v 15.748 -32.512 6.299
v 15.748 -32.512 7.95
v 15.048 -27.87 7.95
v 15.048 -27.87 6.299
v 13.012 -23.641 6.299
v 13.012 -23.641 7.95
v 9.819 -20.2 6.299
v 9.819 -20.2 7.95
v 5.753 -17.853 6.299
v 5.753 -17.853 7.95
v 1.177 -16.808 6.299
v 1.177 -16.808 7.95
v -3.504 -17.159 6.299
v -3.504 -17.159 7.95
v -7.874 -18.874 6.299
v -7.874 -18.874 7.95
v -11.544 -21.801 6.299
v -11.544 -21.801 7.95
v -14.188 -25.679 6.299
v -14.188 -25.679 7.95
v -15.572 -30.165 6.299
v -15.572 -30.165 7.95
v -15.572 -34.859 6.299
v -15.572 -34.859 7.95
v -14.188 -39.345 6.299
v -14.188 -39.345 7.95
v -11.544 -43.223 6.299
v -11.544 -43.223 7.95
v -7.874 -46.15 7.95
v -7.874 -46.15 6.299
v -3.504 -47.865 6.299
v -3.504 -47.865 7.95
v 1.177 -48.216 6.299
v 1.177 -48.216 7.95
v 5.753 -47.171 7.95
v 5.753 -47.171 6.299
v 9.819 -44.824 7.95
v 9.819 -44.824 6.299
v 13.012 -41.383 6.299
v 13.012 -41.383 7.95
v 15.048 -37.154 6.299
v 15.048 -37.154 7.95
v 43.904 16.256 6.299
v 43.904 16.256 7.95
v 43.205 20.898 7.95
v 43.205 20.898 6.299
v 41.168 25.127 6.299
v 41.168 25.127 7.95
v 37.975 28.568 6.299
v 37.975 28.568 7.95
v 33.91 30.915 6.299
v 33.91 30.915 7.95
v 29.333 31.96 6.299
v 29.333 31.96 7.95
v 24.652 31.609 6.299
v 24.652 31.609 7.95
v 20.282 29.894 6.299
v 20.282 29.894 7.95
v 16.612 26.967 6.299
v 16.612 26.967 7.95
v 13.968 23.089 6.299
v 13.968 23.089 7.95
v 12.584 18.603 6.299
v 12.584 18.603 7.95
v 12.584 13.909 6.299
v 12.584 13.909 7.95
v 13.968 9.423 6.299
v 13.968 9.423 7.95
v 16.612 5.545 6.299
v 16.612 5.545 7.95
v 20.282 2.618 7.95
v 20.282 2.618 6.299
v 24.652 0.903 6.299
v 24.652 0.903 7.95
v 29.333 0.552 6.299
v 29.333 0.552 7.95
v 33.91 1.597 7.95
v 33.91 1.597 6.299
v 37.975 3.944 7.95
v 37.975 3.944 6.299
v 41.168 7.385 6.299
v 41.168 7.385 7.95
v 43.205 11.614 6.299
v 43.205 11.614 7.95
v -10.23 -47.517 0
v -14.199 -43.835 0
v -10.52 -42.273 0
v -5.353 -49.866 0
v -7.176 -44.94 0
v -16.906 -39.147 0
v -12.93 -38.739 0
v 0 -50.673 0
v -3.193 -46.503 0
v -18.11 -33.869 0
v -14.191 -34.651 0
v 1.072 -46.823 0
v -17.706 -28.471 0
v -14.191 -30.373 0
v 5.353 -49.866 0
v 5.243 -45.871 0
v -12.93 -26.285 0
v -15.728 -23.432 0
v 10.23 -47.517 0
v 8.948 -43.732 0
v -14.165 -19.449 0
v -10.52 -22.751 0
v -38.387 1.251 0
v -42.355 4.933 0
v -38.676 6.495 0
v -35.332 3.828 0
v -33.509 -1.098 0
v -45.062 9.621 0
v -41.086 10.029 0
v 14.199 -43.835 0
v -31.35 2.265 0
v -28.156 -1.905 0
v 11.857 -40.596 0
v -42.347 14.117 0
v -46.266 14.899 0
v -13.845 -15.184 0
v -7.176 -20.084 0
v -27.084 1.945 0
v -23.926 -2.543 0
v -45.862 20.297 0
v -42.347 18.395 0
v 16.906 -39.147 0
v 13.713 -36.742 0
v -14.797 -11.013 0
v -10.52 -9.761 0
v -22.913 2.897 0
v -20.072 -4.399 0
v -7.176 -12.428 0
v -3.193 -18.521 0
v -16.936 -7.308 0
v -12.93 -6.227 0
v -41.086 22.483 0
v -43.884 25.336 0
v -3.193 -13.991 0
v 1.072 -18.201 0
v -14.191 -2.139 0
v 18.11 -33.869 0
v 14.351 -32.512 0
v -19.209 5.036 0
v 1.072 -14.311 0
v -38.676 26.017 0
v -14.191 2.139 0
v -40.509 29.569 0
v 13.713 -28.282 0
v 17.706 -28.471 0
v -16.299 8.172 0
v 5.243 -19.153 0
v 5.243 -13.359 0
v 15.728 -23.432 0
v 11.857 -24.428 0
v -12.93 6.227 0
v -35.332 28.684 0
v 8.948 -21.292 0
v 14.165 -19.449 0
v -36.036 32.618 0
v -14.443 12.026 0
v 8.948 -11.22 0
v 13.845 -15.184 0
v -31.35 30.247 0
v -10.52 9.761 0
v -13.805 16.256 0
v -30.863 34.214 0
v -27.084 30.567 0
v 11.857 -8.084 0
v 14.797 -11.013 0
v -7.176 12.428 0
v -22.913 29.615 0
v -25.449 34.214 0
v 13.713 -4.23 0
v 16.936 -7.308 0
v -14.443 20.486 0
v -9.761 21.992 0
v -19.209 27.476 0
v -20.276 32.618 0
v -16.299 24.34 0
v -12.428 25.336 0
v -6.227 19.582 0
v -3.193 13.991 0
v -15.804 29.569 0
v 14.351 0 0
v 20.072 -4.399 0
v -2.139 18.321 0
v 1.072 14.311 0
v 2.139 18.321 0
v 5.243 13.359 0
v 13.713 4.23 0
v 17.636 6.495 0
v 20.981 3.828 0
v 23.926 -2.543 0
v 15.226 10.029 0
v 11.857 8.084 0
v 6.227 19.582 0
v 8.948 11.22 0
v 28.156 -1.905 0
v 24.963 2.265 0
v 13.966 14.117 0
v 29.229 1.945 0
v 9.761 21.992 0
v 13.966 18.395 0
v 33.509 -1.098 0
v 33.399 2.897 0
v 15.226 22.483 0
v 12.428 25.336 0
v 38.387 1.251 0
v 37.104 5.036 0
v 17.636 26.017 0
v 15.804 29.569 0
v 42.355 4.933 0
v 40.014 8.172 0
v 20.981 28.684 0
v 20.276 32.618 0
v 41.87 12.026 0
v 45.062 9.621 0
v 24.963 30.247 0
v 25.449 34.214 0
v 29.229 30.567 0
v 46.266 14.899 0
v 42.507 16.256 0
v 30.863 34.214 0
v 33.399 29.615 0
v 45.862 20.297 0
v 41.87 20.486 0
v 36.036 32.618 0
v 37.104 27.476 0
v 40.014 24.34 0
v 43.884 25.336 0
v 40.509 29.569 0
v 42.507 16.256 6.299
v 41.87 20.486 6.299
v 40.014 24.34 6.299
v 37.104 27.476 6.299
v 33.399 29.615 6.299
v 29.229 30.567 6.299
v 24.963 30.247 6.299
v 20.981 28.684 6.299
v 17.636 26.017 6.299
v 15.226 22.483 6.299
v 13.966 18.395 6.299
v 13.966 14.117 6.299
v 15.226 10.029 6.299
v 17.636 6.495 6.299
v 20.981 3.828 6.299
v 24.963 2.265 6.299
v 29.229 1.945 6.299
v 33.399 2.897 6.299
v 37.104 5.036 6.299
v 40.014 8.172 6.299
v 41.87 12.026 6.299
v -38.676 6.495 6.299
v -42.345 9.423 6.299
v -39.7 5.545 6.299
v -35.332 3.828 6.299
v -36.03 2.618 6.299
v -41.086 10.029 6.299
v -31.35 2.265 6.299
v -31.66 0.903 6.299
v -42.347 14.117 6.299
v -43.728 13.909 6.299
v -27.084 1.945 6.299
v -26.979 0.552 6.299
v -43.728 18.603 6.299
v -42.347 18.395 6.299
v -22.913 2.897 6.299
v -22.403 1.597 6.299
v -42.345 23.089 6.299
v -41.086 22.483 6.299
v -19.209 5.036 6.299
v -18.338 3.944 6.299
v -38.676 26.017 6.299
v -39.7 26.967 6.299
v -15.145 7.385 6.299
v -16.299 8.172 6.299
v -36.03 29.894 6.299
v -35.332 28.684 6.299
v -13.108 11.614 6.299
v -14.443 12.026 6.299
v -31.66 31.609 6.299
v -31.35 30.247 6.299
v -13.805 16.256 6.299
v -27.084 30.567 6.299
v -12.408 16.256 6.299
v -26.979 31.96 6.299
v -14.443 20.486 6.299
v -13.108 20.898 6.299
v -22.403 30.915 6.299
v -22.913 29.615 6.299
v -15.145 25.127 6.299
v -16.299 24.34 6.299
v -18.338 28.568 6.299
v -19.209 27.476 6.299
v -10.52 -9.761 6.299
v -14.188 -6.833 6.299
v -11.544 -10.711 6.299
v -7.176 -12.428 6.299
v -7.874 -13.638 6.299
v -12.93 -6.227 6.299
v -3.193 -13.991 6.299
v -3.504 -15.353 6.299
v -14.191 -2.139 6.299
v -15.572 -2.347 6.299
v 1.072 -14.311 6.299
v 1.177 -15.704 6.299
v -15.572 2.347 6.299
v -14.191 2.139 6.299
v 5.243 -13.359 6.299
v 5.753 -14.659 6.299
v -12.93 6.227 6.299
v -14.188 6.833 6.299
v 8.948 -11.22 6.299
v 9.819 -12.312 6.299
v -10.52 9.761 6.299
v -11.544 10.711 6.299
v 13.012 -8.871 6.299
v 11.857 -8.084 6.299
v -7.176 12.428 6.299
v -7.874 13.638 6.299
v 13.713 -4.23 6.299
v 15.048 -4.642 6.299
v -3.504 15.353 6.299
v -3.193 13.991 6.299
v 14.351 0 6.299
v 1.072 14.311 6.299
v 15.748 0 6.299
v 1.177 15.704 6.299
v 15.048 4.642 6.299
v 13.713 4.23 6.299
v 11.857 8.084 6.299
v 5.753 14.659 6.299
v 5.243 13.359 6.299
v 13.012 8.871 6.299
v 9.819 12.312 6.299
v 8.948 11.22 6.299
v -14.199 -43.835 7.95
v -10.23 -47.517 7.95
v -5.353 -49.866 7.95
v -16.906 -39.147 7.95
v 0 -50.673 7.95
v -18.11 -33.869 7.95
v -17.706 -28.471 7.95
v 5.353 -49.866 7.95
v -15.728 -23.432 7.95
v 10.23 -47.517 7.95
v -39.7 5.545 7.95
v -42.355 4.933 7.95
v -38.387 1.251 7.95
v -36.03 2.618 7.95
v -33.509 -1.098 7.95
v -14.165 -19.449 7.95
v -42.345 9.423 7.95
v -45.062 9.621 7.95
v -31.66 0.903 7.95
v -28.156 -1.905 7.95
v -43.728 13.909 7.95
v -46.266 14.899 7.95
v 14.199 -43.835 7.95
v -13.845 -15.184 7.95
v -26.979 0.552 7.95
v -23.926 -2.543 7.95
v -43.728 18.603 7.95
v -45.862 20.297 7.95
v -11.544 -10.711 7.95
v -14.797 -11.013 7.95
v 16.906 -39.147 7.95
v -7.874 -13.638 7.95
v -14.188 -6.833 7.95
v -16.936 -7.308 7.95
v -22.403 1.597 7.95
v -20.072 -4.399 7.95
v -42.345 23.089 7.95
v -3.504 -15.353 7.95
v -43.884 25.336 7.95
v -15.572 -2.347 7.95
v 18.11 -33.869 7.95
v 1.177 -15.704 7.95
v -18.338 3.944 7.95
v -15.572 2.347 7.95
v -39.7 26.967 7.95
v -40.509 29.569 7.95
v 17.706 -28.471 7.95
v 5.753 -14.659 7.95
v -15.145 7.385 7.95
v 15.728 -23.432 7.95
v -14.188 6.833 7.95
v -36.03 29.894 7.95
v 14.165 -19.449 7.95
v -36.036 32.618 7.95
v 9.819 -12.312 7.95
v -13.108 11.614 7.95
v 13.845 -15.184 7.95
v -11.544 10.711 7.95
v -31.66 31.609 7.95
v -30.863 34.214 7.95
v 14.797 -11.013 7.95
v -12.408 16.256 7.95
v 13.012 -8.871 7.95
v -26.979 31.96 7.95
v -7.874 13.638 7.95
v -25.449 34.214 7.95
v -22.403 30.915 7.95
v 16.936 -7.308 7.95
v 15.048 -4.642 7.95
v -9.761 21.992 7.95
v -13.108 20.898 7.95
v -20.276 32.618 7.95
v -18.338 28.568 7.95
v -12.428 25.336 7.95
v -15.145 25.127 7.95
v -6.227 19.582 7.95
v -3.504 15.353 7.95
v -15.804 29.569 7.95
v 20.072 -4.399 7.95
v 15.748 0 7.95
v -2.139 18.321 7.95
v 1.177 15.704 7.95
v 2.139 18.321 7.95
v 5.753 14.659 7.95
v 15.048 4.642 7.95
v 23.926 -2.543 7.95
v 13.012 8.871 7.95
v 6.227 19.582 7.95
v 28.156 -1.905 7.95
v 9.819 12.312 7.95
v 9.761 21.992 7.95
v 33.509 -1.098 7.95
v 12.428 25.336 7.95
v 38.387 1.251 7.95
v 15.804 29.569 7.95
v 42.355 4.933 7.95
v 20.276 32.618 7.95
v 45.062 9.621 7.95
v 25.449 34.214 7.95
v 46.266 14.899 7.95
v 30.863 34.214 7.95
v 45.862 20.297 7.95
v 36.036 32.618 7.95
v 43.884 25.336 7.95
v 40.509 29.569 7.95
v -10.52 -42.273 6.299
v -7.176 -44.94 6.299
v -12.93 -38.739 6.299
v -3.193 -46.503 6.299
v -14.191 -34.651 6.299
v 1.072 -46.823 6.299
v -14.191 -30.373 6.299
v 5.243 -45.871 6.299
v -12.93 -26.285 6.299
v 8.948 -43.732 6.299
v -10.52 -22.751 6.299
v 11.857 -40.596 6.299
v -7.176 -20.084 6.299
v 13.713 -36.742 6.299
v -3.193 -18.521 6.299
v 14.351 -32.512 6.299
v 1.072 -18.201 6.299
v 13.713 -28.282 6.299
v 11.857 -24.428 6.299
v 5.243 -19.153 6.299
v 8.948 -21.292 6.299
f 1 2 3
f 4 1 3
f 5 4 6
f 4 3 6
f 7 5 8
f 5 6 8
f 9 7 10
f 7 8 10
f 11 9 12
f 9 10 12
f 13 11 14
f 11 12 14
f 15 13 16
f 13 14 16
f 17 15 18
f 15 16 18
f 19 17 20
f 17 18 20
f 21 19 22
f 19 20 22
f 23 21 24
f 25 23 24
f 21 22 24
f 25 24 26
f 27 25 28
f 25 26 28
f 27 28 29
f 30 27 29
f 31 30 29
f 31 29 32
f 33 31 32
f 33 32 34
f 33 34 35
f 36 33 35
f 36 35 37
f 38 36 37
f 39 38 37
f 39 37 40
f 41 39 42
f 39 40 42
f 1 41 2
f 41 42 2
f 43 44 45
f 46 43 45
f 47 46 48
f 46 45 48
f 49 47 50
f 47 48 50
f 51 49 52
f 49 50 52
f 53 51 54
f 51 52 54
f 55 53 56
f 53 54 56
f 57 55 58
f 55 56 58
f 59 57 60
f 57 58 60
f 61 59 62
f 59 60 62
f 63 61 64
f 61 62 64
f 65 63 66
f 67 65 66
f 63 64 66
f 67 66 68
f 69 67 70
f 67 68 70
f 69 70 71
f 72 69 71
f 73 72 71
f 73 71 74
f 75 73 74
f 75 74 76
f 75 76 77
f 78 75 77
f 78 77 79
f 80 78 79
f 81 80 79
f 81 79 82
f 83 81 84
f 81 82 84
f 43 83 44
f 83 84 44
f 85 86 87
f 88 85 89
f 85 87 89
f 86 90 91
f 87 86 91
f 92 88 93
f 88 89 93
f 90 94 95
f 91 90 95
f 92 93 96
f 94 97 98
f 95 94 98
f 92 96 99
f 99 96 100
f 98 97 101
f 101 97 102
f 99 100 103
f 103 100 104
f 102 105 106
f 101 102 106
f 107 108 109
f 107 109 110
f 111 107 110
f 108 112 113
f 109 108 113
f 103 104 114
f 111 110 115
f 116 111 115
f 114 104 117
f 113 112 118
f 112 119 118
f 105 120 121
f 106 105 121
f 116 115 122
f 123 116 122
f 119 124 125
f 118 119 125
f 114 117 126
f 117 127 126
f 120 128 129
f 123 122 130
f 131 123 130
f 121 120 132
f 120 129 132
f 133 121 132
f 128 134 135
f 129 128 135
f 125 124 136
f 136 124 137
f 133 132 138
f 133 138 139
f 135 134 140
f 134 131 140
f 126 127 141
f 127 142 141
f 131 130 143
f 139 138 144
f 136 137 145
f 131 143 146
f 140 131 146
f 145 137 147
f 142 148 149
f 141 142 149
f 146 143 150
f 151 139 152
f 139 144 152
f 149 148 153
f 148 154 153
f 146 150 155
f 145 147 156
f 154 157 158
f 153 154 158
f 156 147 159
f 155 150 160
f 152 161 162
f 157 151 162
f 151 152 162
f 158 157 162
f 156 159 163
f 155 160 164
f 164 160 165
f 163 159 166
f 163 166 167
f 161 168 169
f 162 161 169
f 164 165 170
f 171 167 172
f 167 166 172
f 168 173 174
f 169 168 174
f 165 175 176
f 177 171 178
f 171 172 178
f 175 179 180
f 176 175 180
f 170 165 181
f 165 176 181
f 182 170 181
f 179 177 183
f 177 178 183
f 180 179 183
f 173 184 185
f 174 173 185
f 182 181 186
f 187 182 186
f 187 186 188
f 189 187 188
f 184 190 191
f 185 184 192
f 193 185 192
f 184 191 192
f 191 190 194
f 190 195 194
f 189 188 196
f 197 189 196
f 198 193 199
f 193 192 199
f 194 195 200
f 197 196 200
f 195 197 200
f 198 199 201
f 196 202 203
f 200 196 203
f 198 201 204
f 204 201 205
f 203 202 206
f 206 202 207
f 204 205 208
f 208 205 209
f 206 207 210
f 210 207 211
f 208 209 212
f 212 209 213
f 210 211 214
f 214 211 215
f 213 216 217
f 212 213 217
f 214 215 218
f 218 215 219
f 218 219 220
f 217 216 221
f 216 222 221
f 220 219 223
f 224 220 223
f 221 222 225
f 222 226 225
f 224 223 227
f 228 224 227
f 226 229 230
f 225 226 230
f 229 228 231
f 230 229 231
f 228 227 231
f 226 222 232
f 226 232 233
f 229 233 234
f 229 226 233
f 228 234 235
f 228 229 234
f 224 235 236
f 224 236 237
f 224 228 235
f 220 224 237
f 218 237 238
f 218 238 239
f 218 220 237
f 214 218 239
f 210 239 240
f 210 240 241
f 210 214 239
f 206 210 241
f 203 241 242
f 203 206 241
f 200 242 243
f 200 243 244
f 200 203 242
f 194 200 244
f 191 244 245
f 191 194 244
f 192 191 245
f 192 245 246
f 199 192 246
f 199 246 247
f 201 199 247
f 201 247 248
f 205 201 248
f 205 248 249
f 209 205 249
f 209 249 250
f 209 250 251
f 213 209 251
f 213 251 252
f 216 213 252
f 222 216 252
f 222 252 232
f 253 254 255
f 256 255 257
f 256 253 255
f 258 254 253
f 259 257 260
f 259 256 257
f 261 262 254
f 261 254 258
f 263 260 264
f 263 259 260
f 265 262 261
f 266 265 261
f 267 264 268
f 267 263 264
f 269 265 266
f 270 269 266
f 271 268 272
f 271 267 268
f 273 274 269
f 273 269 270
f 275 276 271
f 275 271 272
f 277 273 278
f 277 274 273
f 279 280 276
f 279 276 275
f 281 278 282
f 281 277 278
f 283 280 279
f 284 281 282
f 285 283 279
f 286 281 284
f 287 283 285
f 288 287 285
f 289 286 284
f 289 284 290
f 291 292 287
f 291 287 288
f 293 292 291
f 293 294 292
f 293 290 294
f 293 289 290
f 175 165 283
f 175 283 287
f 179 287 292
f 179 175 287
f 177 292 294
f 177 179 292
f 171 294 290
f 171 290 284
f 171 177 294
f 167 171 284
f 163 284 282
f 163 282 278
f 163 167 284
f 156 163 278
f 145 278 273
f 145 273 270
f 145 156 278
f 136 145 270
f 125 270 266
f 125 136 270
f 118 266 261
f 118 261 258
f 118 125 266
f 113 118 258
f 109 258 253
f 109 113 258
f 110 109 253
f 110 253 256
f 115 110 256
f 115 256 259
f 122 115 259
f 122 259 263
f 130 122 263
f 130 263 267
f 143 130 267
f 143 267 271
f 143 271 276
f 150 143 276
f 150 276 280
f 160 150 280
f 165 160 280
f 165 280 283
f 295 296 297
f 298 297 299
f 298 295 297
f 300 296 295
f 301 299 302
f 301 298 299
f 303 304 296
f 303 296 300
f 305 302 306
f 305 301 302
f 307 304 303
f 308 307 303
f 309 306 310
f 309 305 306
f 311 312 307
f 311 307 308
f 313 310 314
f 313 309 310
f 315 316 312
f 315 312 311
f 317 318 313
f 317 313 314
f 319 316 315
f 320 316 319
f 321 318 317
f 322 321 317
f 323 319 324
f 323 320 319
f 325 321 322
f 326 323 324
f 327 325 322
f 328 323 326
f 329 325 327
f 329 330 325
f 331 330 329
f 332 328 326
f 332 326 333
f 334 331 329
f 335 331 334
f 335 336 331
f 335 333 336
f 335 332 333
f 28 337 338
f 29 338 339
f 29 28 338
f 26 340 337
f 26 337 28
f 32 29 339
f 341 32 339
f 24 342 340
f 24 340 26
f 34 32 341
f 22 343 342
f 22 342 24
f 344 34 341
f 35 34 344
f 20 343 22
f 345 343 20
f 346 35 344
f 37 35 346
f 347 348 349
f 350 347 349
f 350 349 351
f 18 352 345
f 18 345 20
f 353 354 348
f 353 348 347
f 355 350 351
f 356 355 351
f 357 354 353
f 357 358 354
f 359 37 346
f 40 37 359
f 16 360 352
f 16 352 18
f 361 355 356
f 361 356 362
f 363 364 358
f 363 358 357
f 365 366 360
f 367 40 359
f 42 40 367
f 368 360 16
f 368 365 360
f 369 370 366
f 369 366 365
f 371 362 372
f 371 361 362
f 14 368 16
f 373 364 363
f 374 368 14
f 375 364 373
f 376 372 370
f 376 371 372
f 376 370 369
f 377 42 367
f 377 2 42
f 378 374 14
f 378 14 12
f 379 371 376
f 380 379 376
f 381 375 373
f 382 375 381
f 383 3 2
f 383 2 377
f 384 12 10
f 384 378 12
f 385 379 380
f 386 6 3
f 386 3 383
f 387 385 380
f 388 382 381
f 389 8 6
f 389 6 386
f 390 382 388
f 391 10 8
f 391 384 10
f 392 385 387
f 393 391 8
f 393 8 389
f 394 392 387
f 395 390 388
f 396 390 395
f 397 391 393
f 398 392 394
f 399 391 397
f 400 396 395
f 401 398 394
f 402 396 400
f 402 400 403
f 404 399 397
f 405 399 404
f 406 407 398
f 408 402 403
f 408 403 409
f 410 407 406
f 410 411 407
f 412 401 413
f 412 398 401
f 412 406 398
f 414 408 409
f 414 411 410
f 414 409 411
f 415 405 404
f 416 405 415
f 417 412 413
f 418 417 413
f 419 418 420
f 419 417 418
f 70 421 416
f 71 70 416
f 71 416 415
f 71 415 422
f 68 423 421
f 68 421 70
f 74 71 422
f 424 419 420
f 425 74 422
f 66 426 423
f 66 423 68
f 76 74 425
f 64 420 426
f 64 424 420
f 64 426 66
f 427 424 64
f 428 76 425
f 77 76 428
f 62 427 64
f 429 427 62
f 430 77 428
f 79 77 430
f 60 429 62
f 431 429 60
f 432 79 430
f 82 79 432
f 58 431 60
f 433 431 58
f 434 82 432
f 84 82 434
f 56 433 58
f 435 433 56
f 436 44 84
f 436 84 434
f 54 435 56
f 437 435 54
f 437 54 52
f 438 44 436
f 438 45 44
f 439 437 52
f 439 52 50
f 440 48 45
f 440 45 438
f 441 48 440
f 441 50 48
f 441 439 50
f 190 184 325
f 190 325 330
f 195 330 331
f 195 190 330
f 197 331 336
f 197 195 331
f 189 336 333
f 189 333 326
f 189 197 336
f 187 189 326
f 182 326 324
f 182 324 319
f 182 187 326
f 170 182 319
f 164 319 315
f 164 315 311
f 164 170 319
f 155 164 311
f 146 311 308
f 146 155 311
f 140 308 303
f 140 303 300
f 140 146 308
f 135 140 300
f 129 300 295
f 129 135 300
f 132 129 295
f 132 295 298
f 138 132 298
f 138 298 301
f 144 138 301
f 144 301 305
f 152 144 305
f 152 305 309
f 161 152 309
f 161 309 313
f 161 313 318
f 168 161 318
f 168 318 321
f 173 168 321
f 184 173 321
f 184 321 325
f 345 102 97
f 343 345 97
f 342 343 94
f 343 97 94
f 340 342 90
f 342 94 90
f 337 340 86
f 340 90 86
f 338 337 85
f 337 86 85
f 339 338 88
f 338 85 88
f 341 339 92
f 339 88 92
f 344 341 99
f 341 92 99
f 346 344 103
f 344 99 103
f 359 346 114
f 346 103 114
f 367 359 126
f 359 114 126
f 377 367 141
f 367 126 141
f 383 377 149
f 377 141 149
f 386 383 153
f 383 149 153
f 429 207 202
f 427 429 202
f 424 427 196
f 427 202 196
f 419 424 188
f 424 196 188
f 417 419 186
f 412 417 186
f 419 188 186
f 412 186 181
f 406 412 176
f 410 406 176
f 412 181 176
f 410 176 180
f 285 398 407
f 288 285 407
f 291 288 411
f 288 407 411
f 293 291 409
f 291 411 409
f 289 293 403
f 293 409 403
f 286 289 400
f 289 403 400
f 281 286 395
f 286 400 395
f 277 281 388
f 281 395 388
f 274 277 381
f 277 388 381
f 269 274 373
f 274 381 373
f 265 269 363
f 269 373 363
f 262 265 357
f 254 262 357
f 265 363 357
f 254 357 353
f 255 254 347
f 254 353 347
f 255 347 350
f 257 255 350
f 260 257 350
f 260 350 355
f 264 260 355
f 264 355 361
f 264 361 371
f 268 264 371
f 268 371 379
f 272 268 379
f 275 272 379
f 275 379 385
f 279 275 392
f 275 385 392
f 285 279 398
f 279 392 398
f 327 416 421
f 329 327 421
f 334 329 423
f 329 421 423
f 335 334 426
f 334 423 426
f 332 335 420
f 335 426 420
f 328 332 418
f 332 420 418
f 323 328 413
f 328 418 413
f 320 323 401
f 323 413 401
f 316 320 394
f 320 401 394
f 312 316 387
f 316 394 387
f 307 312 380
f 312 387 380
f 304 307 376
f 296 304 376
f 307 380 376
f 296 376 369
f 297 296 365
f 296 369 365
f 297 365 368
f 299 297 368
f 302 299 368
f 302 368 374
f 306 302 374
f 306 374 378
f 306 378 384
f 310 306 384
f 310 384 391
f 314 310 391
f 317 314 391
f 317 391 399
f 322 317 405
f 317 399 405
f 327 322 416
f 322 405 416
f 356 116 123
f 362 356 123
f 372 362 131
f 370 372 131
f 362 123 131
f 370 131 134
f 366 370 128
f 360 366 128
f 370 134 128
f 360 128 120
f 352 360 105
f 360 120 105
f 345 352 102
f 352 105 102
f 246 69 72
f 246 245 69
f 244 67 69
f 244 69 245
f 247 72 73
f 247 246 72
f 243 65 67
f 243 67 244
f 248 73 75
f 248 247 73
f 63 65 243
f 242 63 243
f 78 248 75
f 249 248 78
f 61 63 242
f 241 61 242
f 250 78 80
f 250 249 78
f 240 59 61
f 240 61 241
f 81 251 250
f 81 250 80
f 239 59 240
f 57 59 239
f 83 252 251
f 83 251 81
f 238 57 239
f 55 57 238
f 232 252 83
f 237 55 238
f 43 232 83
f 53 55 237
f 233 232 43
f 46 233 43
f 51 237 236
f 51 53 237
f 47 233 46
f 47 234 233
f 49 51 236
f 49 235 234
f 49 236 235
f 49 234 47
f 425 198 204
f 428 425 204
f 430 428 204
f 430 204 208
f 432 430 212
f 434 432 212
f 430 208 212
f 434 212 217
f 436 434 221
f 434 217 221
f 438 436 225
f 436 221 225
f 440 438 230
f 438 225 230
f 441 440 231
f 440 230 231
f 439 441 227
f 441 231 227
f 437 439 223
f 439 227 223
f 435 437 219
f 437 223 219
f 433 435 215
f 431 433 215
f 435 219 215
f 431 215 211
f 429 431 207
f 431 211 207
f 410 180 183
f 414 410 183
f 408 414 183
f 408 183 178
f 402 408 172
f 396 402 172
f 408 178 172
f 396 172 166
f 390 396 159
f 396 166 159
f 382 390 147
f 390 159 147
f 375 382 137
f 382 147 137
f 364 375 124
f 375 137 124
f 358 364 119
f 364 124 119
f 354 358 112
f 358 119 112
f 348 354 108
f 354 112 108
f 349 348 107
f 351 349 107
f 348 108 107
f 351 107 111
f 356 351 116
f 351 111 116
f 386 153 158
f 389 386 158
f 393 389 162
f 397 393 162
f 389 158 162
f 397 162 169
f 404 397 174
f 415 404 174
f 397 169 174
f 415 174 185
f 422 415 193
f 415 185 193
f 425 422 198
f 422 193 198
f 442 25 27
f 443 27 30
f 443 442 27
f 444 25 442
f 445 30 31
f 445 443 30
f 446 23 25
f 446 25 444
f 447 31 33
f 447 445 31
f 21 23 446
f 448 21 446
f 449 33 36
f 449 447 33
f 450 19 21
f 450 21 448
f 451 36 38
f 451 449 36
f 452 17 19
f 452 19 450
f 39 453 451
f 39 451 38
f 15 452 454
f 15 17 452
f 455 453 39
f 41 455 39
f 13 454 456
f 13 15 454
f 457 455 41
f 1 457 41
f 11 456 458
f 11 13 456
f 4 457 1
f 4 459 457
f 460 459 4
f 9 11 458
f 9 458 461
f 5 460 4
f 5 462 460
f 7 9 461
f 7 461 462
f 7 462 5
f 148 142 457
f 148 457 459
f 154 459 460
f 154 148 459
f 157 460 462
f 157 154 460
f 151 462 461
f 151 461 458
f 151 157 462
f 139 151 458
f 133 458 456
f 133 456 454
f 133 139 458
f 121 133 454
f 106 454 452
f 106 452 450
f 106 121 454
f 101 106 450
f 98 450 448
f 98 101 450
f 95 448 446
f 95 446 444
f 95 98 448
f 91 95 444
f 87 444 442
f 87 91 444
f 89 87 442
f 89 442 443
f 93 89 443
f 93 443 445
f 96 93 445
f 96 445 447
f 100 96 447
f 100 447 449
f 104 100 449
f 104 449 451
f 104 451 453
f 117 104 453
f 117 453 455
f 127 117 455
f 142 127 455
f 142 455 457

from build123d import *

# Parameters (mm, degrees)
F0_R     = 14.351
F1_DEPTH = 7.9502
F2_R     = 15.748
F2_R_2   = 14.351
F3_DEPTH = 1.651
F4_DEPTH = 1.651
F5_DEPTH = 1.651
F6_DEPTH = 1.651


with BuildPart() as f1:
    # F0 (on Top) → F1 (new body)
    with BuildSketch(Plane.XY):
        with BuildLine():
            ThreePointArc((12.428331, 25.3365), (0, 18.161), (-12.428331, 25.3365))
            ThreePointArc((-12.428331, 25.3365), (-43.884105, 25.3365), (-28.156218, -1.905))
            ThreePointArc((-28.156218, -1.905), (-15.727887, -9.0805), (-15.727887, -23.4315))
            ThreePointArc((-15.727887, -23.4315), (0, -50.673), (15.727887, -23.4315))
            ThreePointArc((15.727887, -23.4315), (15.727887, -9.0805), (28.156218, -1.905))
            ThreePointArc((28.156218, -1.905), (43.884105, 25.3365), (12.428331, 25.3365))
        make_face()
        with Locations((0, -32.512)):
            Circle(F0_R, mode=Mode.SUBTRACT)
        Circle(F0_R, mode=Mode.SUBTRACT)
        with Locations((-28.156218, 16.256)):
            Circle(F0_R, mode=Mode.SUBTRACT)
        with Locations((28.156218, 16.256)):
            Circle(F0_R, mode=Mode.SUBTRACT)
    extrude(amount=F1_DEPTH)

    # F2 (on face) → F3 (cut)
    with BuildSketch(Plane.XY.offset(7.9502)):
        with Locations((-28.156218, 16.256)):
            Circle(F2_R)
        with Locations((-28.156218, 16.256)):
            Circle(F2_R_2, mode=Mode.SUBTRACT)
    extrude(amount=-F3_DEPTH, mode=Mode.SUBTRACT)

    # F2 (on face) → F4 (cut)
    with BuildSketch(Plane.XY.offset(7.9502)):
        with Locations((28.156218, 16.256)):
            Circle(F2_R)
        with Locations((28.156218, 16.256)):
            Circle(F2_R_2, mode=Mode.SUBTRACT)
    extrude(amount=-F4_DEPTH, mode=Mode.SUBTRACT)

    # F2 (on face) → F5 (cut)
    with BuildSketch(Plane.XY.offset(7.9502)):
        with Locations((0, -32.512)):
            Circle(F2_R)
        with Locations((0, -32.512)):
            Circle(F2_R_2, mode=Mode.SUBTRACT)
    extrude(amount=-F5_DEPTH, mode=Mode.SUBTRACT)

    # F2 (on face) → F6 (cut)
    with BuildSketch(Plane.XY.offset(7.9502)):
        Circle(F2_R)
        Circle(F2_R_2, mode=Mode.SUBTRACT)
    extrude(amount=-F6_DEPTH, mode=Mode.SUBTRACT)


solid = f1.part
